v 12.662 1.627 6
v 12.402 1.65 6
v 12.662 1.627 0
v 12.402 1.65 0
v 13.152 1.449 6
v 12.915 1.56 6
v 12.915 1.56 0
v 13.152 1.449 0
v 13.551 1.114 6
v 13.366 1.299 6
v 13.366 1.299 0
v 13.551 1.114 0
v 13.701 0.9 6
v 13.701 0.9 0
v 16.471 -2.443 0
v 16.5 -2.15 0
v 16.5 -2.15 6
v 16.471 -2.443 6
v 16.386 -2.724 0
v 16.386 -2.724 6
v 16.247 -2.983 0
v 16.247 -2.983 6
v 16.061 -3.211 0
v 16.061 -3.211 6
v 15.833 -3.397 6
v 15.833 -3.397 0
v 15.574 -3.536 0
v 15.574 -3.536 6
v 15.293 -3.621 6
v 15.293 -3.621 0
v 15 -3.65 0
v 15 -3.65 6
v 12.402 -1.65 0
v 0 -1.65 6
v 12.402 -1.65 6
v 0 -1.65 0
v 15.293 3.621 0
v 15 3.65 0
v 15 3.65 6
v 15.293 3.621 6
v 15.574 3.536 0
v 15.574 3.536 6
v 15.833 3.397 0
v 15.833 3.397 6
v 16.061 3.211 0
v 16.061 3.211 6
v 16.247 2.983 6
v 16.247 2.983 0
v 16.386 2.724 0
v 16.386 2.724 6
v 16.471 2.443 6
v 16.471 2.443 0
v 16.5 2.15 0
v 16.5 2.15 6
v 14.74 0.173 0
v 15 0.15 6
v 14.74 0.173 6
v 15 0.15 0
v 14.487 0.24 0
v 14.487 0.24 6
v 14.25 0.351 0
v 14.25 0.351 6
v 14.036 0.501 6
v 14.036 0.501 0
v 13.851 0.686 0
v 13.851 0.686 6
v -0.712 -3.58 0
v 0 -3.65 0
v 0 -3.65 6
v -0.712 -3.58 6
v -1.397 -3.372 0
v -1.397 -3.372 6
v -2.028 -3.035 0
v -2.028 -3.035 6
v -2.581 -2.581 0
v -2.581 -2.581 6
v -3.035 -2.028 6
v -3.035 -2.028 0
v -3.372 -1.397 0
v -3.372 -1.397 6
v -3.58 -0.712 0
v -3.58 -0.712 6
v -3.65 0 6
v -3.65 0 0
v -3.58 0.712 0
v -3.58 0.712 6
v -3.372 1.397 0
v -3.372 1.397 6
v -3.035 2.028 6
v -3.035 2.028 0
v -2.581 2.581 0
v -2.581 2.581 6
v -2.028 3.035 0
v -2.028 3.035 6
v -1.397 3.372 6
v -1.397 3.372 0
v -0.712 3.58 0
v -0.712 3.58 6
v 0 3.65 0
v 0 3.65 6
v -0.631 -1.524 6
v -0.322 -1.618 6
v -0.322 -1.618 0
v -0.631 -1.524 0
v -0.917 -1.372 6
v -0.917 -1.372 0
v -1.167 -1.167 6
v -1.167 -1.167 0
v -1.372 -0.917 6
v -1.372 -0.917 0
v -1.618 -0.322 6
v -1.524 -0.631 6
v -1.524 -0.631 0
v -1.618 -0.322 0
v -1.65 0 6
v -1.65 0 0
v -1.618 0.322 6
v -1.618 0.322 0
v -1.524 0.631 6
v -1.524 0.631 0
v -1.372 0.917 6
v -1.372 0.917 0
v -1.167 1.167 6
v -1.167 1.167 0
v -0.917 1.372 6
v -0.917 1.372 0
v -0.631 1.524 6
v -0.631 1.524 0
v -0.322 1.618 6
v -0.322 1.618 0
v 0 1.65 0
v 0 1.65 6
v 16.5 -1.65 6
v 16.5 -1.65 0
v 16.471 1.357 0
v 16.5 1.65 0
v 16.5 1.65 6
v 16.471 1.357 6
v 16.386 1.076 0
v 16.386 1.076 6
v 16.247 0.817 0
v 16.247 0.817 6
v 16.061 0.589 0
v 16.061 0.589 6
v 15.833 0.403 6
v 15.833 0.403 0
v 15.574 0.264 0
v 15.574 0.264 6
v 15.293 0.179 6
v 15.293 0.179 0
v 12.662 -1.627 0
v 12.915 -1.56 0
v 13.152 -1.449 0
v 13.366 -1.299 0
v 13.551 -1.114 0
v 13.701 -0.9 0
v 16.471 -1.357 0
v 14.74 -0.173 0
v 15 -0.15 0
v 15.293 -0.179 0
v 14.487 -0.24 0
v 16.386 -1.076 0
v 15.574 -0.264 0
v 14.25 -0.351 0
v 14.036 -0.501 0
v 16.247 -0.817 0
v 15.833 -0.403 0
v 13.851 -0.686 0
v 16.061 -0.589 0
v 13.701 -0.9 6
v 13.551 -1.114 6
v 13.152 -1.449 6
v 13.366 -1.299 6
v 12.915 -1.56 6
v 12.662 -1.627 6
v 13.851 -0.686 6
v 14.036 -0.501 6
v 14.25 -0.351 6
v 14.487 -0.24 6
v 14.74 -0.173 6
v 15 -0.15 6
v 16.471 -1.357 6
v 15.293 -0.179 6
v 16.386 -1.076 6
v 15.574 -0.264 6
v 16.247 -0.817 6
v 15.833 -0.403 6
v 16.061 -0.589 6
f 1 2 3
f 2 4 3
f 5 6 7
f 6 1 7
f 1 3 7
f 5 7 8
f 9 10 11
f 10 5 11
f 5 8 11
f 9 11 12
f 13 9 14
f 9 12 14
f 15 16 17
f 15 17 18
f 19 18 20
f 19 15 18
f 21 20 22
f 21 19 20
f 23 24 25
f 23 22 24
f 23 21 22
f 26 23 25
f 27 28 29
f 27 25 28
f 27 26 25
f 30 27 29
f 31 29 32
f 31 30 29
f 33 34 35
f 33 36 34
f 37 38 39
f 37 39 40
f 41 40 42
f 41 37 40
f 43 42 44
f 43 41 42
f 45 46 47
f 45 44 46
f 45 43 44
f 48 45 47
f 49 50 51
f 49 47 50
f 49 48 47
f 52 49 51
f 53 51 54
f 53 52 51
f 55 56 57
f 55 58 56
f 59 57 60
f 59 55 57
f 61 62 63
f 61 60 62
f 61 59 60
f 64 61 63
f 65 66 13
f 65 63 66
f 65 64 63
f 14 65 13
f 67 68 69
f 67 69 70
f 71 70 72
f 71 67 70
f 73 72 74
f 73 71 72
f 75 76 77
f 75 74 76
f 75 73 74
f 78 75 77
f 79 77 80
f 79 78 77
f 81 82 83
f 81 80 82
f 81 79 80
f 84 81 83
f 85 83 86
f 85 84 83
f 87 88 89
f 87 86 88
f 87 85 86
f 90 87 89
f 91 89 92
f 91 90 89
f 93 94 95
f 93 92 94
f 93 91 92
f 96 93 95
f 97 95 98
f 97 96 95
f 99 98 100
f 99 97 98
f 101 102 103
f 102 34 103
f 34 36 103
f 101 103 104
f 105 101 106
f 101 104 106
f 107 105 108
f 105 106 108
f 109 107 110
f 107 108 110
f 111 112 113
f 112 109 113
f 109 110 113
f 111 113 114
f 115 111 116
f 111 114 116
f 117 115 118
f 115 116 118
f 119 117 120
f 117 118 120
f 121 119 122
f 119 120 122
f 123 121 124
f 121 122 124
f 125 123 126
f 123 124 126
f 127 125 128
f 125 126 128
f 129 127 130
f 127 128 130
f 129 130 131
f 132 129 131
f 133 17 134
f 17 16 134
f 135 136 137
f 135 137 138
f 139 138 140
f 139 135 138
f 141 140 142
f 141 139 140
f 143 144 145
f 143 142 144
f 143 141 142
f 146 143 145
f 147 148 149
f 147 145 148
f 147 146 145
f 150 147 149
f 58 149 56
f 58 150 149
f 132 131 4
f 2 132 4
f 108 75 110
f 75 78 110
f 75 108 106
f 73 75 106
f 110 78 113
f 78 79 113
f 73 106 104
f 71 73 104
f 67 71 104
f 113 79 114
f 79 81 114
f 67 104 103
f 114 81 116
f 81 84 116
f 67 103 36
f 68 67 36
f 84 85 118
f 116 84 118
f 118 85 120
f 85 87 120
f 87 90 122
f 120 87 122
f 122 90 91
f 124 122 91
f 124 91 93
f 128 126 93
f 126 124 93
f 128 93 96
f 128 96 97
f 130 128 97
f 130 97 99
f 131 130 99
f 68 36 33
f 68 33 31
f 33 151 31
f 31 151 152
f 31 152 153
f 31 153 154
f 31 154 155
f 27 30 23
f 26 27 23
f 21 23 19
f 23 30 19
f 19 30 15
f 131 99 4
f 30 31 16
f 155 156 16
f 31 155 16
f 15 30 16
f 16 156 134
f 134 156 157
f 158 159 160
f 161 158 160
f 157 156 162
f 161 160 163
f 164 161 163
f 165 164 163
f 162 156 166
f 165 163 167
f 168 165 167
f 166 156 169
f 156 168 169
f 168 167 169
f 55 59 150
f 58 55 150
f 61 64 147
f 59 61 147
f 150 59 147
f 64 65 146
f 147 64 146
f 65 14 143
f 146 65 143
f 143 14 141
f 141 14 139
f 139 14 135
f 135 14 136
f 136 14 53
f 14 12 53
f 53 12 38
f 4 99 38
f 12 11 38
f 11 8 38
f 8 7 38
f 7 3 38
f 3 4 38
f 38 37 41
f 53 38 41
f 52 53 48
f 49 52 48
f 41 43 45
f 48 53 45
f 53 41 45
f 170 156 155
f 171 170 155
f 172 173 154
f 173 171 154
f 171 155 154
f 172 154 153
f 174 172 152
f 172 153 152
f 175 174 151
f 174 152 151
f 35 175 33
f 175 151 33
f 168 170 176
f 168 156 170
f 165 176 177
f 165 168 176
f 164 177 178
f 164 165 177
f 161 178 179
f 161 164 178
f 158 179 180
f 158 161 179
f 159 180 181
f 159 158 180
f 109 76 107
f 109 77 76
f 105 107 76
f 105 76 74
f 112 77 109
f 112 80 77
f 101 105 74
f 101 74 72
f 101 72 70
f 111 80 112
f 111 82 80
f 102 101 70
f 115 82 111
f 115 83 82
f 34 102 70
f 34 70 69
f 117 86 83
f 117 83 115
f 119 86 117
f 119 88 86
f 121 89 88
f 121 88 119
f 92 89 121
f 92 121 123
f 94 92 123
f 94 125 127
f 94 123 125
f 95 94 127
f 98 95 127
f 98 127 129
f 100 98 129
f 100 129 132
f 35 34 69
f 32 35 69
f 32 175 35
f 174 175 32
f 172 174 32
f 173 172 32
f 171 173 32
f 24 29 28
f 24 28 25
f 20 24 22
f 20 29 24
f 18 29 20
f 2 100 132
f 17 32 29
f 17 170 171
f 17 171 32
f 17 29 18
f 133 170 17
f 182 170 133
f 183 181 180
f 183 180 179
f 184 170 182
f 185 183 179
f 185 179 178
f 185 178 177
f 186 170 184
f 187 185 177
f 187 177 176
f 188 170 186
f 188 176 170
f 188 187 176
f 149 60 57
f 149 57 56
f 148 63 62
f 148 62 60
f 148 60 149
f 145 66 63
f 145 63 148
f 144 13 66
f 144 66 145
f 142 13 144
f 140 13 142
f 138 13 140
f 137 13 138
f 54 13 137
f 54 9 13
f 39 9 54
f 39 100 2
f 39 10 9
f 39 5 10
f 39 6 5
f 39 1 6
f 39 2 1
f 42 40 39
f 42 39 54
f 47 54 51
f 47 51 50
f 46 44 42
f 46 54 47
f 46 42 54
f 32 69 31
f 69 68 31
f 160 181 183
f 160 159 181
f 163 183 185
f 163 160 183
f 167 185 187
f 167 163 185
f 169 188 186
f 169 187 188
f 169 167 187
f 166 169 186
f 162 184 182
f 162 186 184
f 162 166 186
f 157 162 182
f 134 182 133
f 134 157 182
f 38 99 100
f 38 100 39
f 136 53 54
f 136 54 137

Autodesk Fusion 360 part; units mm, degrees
sketch "Sketch1" plane through (0, 0, 0) normal (0, 0, 1) x (1, 0, 0)
  circle A0 centre (0, 0) radius 1.65
  circle A1 centre (0, 0) radius 3.65
  line L0 (0, 0) -> (0, -3.65)
  line L1 (0, 0) -> (0, 3.65)
  line L2 (0, 3.65) -> (15, 3.65)
  line L3 (0, -3.65) -> (15, -3.65)
  line L4 (0, 1.65) -> (12.4019, 1.65)
  line L5 (0, -1.65) -> (12.4019, -1.65)
  line L6 (16.5, 2.15) -> (16.5, 1.65)
  line L7 (16.5, -2.15) -> (16.5, -1.65)
  arc A2 (15, -0.15) -> (13.701, -0.9) centre (15, -1.65) ccw
  arc A3 (16.5, -1.65) -> (15, -0.15) centre (15, -1.65) ccw
  arc A4 (13.701, 0.9) -> (15, 0.15) centre (15, 1.65) ccw
  arc A5 (15, 0.15) -> (16.5, 1.65) centre (15, 1.65) ccw
  arc A6 (13.701, 0.9) -> (12.4019, 1.65) centre (12.4019, 0.15) ccw
  arc A7 (12.4019, -1.65) -> (13.701, -0.9) centre (12.4019, -0.15) ccw
  arc A8 (15, -3.65) -> (16.5, -2.15) centre (15, -2.15) ccw
  arc A9 (16.5, 2.15) -> (15, 3.65) centre (15, 2.15) ccw
  point P0 (16.5, 3.65)
  point P1 (16.5, -3.65)
  point P2 (13.5, 1.65)
  point P3 (13.5, -1.65)
  point P4 (16.5, 3.65)
  point P5 (16.5, 0.15)
  point P6 (16.5, -3.65)
  point P7 (16.5, -0.15)
  point P8 (13.5, 0.15)
  point P9 (13.5, -0.15)
  dimension "d1" = 3.3
  dimension "d2" = 7.3
  dimension "d10" = 16.5
  dimension "d11" = 16.5
  dimension "d18" = 13.5
  dimension "d19" = 13.5
  dimension "d23" = 3.5
  dimension "d24" = 3.5
  dimension "d25" = 3
  dimension "d26" = 3
  dimension "d27" = 1.5
  dimension "d28" = 1.5
  dimension "d29" = 1.5
  dimension "d30" = 1.5
  dimension "d31" = 1.5
  dimension "d32" = 1.5
  dimension "d33" = 1.5
  dimension "d34" = 1.5
extrude "Extrude4" add sketch "Sketch1" along normal blind 6 contours A0 A1 L0 L1 | A1 L1 L4 | A1 L0 L5 | A1 L2 L4 L6 A4 A5 A6 A9 | A1 L3 L5 L7 A2 A3 A7 A8
